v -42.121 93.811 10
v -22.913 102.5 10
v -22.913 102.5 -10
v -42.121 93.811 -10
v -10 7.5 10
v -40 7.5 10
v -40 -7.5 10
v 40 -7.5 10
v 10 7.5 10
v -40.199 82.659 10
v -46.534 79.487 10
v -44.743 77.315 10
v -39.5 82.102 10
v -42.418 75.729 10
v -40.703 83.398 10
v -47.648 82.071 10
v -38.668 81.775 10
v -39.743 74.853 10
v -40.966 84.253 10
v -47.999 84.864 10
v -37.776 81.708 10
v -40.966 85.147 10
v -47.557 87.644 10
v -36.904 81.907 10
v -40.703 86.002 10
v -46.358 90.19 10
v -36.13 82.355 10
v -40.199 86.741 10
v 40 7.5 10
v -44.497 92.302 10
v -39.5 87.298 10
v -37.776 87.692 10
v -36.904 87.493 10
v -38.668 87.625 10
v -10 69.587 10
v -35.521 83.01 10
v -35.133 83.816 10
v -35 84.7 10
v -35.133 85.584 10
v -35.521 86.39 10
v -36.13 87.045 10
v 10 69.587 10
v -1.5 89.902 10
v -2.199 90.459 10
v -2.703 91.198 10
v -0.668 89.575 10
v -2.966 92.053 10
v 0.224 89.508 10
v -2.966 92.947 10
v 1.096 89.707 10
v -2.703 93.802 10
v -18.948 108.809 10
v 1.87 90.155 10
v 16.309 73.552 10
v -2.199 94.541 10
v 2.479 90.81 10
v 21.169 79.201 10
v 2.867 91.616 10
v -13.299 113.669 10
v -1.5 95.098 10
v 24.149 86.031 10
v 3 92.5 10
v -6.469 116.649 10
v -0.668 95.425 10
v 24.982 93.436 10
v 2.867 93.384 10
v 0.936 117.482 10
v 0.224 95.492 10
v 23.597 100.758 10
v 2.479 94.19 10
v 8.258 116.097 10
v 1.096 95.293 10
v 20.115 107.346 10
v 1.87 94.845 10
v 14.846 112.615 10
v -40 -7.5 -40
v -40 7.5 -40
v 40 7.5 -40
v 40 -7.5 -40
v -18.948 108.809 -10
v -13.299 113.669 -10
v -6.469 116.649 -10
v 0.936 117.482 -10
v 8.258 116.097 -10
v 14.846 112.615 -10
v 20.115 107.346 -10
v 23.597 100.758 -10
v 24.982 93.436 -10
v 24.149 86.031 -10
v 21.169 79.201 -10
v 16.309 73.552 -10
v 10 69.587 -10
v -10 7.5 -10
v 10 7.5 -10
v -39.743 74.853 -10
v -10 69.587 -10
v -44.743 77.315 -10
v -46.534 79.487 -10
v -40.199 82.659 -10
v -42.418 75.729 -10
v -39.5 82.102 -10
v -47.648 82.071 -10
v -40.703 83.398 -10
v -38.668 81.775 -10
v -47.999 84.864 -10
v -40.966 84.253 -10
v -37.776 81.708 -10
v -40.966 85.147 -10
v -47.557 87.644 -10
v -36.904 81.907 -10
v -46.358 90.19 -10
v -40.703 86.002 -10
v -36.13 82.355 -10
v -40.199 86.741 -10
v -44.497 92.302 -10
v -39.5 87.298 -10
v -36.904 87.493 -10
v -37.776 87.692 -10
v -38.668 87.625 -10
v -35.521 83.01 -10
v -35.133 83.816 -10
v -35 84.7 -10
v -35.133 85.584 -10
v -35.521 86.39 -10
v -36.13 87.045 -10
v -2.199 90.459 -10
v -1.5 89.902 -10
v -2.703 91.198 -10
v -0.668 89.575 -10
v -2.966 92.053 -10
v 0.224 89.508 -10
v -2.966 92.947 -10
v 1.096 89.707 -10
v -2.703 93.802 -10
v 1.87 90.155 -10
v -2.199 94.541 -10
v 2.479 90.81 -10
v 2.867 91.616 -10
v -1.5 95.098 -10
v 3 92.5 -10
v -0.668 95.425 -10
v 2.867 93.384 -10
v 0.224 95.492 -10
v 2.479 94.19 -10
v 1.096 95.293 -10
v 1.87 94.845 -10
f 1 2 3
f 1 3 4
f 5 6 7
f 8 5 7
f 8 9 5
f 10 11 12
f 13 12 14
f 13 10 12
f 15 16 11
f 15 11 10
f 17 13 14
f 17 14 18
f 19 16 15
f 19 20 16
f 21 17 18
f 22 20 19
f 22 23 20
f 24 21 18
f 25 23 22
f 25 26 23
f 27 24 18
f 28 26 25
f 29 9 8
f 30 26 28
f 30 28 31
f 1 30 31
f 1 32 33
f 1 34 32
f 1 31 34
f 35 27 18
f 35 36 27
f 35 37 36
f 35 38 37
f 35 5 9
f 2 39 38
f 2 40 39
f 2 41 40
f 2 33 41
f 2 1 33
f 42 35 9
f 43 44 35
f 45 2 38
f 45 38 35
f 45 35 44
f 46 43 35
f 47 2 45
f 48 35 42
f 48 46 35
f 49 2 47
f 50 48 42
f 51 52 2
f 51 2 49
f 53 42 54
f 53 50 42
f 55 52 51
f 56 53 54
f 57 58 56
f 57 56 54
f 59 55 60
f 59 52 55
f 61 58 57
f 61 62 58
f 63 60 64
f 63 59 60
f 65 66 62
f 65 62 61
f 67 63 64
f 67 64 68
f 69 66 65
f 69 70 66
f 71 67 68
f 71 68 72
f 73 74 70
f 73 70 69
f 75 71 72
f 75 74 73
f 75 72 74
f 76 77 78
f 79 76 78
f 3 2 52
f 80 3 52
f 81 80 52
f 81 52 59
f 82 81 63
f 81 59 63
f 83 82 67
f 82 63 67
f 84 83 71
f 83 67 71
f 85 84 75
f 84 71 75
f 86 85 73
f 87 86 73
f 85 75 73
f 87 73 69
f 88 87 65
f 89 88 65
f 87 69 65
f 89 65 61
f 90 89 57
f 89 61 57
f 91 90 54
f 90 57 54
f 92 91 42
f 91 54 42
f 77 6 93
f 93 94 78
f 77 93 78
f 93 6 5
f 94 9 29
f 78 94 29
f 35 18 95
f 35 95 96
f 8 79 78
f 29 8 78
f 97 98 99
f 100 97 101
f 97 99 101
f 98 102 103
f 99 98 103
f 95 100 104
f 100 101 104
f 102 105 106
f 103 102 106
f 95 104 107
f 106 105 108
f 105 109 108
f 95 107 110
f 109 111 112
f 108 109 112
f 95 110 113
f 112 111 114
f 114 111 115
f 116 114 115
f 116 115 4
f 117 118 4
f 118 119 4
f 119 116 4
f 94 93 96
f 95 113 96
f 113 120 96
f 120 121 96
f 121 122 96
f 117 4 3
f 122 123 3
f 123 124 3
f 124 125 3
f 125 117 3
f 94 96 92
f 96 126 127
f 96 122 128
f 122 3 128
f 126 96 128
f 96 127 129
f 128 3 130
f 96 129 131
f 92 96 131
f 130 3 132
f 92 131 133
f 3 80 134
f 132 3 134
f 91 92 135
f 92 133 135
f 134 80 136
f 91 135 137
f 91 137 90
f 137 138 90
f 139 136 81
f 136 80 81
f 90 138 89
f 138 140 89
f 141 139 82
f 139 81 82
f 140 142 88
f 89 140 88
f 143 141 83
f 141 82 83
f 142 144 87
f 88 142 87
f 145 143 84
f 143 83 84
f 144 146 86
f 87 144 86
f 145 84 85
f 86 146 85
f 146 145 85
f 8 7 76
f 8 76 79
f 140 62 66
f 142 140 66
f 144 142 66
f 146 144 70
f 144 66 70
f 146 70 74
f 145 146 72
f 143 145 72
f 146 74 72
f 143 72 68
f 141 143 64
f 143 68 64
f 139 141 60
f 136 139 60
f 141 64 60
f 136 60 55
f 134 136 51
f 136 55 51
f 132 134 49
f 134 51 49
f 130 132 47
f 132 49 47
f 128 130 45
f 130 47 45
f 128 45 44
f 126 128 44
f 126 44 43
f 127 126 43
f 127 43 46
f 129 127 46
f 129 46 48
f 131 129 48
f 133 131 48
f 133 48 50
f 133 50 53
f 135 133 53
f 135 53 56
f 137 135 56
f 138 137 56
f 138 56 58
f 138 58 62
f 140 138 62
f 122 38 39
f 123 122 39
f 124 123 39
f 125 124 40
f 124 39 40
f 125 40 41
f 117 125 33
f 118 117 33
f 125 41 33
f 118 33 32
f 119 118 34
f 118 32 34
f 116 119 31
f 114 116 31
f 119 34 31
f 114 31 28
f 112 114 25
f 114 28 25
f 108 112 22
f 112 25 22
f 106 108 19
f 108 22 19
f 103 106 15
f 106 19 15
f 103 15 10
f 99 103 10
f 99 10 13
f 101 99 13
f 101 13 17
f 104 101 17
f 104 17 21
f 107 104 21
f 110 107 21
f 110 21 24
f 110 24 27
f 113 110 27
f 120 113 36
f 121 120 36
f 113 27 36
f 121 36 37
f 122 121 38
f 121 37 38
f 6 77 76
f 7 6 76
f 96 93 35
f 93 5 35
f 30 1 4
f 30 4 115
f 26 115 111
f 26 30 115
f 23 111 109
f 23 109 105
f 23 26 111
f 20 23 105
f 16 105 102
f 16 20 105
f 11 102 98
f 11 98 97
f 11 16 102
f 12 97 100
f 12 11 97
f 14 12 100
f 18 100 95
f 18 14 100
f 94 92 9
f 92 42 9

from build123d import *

# Parameters (mm, degrees)
BOSS_EXTRUDE1_DEPTH = 10
BOSS_EXTRUDE2_DEPTH = 40
SKETCH3_R           = 3
CUT_EXTRUDE1_DEPTH  = 134.814236911
SKETCH4_R           = 3
BOSS_EXTRUDE4_DEPTH = 20


with BuildPart() as part:
    # Sketch1 → Boss-Extrude1 (new, symmetric)
    with BuildSketch(Plane.XY):
        with BuildLine():
            Line((-40, 7.5), (-10, 7.5))
            Line((-10, 7.5), (-10, 69.587121525))
            ThreePointArc((-10, 69.587121525), (0, 117.5), (10, 69.587121525))
            Line((10, 69.587121525), (10, 7.5))
            Line((10, 7.5), (40, 7.5))
            Line((40, 7.5), (40, -7.5))
            Line((40, -7.5), (-40, -7.5))
            Line((-40, -7.5), (-40, 7.5))
        make_face()
    extrude(amount=BOSS_EXTRUDE1_DEPTH, both=True)

    # Sketch2 → Boss-Extrude2 (add)
    with BuildSketch(Plane(origin=(0, 0, 0), x_dir=(-1, 0, 0), z_dir=(0, 0, -1))):
        Polygon((-10, 7.5), (10, 7.5), (40, 7.5), (40, -7.5), (-40, -7.5), (-40, 7.5), align=None)
    extrude(amount=BOSS_EXTRUDE2_DEPTH)

    # Sketch3 → Cut-Extrude1 (cut, through all)
    with BuildSketch(Plane.XY.offset(10)):
        with Locations((0, 92.5)):
            Circle(SKETCH3_R)
    extrude(amount=-CUT_EXTRUDE1_DEPTH, mode=Mode.SUBTRACT)

    # Sketch4 → Boss-Extrude4 (add)
    with BuildSketch(Plane.XY.offset(10)):
        with BuildLine():
            ThreePointArc((-10, 69.587121525), (-23.272919558, 83.369216066), (-22.912878475, 102.5))
            Line((-22.912878475, 102.5), (-42.121373711, 93.811217193))
            ThreePointArc((-42.121373711, 93.811217193), (-47.922246908, 83.455405164), (-39.743371486, 74.853139797))
            Line((-39.743371486, 74.853139797), (-10, 69.587121525))
        make_face()
        with Locations((-38, 84.7)):
            Circle(SKETCH4_R, mode=Mode.SUBTRACT)
    extrude(amount=-BOSS_EXTRUDE4_DEPTH)


solid = part.part
